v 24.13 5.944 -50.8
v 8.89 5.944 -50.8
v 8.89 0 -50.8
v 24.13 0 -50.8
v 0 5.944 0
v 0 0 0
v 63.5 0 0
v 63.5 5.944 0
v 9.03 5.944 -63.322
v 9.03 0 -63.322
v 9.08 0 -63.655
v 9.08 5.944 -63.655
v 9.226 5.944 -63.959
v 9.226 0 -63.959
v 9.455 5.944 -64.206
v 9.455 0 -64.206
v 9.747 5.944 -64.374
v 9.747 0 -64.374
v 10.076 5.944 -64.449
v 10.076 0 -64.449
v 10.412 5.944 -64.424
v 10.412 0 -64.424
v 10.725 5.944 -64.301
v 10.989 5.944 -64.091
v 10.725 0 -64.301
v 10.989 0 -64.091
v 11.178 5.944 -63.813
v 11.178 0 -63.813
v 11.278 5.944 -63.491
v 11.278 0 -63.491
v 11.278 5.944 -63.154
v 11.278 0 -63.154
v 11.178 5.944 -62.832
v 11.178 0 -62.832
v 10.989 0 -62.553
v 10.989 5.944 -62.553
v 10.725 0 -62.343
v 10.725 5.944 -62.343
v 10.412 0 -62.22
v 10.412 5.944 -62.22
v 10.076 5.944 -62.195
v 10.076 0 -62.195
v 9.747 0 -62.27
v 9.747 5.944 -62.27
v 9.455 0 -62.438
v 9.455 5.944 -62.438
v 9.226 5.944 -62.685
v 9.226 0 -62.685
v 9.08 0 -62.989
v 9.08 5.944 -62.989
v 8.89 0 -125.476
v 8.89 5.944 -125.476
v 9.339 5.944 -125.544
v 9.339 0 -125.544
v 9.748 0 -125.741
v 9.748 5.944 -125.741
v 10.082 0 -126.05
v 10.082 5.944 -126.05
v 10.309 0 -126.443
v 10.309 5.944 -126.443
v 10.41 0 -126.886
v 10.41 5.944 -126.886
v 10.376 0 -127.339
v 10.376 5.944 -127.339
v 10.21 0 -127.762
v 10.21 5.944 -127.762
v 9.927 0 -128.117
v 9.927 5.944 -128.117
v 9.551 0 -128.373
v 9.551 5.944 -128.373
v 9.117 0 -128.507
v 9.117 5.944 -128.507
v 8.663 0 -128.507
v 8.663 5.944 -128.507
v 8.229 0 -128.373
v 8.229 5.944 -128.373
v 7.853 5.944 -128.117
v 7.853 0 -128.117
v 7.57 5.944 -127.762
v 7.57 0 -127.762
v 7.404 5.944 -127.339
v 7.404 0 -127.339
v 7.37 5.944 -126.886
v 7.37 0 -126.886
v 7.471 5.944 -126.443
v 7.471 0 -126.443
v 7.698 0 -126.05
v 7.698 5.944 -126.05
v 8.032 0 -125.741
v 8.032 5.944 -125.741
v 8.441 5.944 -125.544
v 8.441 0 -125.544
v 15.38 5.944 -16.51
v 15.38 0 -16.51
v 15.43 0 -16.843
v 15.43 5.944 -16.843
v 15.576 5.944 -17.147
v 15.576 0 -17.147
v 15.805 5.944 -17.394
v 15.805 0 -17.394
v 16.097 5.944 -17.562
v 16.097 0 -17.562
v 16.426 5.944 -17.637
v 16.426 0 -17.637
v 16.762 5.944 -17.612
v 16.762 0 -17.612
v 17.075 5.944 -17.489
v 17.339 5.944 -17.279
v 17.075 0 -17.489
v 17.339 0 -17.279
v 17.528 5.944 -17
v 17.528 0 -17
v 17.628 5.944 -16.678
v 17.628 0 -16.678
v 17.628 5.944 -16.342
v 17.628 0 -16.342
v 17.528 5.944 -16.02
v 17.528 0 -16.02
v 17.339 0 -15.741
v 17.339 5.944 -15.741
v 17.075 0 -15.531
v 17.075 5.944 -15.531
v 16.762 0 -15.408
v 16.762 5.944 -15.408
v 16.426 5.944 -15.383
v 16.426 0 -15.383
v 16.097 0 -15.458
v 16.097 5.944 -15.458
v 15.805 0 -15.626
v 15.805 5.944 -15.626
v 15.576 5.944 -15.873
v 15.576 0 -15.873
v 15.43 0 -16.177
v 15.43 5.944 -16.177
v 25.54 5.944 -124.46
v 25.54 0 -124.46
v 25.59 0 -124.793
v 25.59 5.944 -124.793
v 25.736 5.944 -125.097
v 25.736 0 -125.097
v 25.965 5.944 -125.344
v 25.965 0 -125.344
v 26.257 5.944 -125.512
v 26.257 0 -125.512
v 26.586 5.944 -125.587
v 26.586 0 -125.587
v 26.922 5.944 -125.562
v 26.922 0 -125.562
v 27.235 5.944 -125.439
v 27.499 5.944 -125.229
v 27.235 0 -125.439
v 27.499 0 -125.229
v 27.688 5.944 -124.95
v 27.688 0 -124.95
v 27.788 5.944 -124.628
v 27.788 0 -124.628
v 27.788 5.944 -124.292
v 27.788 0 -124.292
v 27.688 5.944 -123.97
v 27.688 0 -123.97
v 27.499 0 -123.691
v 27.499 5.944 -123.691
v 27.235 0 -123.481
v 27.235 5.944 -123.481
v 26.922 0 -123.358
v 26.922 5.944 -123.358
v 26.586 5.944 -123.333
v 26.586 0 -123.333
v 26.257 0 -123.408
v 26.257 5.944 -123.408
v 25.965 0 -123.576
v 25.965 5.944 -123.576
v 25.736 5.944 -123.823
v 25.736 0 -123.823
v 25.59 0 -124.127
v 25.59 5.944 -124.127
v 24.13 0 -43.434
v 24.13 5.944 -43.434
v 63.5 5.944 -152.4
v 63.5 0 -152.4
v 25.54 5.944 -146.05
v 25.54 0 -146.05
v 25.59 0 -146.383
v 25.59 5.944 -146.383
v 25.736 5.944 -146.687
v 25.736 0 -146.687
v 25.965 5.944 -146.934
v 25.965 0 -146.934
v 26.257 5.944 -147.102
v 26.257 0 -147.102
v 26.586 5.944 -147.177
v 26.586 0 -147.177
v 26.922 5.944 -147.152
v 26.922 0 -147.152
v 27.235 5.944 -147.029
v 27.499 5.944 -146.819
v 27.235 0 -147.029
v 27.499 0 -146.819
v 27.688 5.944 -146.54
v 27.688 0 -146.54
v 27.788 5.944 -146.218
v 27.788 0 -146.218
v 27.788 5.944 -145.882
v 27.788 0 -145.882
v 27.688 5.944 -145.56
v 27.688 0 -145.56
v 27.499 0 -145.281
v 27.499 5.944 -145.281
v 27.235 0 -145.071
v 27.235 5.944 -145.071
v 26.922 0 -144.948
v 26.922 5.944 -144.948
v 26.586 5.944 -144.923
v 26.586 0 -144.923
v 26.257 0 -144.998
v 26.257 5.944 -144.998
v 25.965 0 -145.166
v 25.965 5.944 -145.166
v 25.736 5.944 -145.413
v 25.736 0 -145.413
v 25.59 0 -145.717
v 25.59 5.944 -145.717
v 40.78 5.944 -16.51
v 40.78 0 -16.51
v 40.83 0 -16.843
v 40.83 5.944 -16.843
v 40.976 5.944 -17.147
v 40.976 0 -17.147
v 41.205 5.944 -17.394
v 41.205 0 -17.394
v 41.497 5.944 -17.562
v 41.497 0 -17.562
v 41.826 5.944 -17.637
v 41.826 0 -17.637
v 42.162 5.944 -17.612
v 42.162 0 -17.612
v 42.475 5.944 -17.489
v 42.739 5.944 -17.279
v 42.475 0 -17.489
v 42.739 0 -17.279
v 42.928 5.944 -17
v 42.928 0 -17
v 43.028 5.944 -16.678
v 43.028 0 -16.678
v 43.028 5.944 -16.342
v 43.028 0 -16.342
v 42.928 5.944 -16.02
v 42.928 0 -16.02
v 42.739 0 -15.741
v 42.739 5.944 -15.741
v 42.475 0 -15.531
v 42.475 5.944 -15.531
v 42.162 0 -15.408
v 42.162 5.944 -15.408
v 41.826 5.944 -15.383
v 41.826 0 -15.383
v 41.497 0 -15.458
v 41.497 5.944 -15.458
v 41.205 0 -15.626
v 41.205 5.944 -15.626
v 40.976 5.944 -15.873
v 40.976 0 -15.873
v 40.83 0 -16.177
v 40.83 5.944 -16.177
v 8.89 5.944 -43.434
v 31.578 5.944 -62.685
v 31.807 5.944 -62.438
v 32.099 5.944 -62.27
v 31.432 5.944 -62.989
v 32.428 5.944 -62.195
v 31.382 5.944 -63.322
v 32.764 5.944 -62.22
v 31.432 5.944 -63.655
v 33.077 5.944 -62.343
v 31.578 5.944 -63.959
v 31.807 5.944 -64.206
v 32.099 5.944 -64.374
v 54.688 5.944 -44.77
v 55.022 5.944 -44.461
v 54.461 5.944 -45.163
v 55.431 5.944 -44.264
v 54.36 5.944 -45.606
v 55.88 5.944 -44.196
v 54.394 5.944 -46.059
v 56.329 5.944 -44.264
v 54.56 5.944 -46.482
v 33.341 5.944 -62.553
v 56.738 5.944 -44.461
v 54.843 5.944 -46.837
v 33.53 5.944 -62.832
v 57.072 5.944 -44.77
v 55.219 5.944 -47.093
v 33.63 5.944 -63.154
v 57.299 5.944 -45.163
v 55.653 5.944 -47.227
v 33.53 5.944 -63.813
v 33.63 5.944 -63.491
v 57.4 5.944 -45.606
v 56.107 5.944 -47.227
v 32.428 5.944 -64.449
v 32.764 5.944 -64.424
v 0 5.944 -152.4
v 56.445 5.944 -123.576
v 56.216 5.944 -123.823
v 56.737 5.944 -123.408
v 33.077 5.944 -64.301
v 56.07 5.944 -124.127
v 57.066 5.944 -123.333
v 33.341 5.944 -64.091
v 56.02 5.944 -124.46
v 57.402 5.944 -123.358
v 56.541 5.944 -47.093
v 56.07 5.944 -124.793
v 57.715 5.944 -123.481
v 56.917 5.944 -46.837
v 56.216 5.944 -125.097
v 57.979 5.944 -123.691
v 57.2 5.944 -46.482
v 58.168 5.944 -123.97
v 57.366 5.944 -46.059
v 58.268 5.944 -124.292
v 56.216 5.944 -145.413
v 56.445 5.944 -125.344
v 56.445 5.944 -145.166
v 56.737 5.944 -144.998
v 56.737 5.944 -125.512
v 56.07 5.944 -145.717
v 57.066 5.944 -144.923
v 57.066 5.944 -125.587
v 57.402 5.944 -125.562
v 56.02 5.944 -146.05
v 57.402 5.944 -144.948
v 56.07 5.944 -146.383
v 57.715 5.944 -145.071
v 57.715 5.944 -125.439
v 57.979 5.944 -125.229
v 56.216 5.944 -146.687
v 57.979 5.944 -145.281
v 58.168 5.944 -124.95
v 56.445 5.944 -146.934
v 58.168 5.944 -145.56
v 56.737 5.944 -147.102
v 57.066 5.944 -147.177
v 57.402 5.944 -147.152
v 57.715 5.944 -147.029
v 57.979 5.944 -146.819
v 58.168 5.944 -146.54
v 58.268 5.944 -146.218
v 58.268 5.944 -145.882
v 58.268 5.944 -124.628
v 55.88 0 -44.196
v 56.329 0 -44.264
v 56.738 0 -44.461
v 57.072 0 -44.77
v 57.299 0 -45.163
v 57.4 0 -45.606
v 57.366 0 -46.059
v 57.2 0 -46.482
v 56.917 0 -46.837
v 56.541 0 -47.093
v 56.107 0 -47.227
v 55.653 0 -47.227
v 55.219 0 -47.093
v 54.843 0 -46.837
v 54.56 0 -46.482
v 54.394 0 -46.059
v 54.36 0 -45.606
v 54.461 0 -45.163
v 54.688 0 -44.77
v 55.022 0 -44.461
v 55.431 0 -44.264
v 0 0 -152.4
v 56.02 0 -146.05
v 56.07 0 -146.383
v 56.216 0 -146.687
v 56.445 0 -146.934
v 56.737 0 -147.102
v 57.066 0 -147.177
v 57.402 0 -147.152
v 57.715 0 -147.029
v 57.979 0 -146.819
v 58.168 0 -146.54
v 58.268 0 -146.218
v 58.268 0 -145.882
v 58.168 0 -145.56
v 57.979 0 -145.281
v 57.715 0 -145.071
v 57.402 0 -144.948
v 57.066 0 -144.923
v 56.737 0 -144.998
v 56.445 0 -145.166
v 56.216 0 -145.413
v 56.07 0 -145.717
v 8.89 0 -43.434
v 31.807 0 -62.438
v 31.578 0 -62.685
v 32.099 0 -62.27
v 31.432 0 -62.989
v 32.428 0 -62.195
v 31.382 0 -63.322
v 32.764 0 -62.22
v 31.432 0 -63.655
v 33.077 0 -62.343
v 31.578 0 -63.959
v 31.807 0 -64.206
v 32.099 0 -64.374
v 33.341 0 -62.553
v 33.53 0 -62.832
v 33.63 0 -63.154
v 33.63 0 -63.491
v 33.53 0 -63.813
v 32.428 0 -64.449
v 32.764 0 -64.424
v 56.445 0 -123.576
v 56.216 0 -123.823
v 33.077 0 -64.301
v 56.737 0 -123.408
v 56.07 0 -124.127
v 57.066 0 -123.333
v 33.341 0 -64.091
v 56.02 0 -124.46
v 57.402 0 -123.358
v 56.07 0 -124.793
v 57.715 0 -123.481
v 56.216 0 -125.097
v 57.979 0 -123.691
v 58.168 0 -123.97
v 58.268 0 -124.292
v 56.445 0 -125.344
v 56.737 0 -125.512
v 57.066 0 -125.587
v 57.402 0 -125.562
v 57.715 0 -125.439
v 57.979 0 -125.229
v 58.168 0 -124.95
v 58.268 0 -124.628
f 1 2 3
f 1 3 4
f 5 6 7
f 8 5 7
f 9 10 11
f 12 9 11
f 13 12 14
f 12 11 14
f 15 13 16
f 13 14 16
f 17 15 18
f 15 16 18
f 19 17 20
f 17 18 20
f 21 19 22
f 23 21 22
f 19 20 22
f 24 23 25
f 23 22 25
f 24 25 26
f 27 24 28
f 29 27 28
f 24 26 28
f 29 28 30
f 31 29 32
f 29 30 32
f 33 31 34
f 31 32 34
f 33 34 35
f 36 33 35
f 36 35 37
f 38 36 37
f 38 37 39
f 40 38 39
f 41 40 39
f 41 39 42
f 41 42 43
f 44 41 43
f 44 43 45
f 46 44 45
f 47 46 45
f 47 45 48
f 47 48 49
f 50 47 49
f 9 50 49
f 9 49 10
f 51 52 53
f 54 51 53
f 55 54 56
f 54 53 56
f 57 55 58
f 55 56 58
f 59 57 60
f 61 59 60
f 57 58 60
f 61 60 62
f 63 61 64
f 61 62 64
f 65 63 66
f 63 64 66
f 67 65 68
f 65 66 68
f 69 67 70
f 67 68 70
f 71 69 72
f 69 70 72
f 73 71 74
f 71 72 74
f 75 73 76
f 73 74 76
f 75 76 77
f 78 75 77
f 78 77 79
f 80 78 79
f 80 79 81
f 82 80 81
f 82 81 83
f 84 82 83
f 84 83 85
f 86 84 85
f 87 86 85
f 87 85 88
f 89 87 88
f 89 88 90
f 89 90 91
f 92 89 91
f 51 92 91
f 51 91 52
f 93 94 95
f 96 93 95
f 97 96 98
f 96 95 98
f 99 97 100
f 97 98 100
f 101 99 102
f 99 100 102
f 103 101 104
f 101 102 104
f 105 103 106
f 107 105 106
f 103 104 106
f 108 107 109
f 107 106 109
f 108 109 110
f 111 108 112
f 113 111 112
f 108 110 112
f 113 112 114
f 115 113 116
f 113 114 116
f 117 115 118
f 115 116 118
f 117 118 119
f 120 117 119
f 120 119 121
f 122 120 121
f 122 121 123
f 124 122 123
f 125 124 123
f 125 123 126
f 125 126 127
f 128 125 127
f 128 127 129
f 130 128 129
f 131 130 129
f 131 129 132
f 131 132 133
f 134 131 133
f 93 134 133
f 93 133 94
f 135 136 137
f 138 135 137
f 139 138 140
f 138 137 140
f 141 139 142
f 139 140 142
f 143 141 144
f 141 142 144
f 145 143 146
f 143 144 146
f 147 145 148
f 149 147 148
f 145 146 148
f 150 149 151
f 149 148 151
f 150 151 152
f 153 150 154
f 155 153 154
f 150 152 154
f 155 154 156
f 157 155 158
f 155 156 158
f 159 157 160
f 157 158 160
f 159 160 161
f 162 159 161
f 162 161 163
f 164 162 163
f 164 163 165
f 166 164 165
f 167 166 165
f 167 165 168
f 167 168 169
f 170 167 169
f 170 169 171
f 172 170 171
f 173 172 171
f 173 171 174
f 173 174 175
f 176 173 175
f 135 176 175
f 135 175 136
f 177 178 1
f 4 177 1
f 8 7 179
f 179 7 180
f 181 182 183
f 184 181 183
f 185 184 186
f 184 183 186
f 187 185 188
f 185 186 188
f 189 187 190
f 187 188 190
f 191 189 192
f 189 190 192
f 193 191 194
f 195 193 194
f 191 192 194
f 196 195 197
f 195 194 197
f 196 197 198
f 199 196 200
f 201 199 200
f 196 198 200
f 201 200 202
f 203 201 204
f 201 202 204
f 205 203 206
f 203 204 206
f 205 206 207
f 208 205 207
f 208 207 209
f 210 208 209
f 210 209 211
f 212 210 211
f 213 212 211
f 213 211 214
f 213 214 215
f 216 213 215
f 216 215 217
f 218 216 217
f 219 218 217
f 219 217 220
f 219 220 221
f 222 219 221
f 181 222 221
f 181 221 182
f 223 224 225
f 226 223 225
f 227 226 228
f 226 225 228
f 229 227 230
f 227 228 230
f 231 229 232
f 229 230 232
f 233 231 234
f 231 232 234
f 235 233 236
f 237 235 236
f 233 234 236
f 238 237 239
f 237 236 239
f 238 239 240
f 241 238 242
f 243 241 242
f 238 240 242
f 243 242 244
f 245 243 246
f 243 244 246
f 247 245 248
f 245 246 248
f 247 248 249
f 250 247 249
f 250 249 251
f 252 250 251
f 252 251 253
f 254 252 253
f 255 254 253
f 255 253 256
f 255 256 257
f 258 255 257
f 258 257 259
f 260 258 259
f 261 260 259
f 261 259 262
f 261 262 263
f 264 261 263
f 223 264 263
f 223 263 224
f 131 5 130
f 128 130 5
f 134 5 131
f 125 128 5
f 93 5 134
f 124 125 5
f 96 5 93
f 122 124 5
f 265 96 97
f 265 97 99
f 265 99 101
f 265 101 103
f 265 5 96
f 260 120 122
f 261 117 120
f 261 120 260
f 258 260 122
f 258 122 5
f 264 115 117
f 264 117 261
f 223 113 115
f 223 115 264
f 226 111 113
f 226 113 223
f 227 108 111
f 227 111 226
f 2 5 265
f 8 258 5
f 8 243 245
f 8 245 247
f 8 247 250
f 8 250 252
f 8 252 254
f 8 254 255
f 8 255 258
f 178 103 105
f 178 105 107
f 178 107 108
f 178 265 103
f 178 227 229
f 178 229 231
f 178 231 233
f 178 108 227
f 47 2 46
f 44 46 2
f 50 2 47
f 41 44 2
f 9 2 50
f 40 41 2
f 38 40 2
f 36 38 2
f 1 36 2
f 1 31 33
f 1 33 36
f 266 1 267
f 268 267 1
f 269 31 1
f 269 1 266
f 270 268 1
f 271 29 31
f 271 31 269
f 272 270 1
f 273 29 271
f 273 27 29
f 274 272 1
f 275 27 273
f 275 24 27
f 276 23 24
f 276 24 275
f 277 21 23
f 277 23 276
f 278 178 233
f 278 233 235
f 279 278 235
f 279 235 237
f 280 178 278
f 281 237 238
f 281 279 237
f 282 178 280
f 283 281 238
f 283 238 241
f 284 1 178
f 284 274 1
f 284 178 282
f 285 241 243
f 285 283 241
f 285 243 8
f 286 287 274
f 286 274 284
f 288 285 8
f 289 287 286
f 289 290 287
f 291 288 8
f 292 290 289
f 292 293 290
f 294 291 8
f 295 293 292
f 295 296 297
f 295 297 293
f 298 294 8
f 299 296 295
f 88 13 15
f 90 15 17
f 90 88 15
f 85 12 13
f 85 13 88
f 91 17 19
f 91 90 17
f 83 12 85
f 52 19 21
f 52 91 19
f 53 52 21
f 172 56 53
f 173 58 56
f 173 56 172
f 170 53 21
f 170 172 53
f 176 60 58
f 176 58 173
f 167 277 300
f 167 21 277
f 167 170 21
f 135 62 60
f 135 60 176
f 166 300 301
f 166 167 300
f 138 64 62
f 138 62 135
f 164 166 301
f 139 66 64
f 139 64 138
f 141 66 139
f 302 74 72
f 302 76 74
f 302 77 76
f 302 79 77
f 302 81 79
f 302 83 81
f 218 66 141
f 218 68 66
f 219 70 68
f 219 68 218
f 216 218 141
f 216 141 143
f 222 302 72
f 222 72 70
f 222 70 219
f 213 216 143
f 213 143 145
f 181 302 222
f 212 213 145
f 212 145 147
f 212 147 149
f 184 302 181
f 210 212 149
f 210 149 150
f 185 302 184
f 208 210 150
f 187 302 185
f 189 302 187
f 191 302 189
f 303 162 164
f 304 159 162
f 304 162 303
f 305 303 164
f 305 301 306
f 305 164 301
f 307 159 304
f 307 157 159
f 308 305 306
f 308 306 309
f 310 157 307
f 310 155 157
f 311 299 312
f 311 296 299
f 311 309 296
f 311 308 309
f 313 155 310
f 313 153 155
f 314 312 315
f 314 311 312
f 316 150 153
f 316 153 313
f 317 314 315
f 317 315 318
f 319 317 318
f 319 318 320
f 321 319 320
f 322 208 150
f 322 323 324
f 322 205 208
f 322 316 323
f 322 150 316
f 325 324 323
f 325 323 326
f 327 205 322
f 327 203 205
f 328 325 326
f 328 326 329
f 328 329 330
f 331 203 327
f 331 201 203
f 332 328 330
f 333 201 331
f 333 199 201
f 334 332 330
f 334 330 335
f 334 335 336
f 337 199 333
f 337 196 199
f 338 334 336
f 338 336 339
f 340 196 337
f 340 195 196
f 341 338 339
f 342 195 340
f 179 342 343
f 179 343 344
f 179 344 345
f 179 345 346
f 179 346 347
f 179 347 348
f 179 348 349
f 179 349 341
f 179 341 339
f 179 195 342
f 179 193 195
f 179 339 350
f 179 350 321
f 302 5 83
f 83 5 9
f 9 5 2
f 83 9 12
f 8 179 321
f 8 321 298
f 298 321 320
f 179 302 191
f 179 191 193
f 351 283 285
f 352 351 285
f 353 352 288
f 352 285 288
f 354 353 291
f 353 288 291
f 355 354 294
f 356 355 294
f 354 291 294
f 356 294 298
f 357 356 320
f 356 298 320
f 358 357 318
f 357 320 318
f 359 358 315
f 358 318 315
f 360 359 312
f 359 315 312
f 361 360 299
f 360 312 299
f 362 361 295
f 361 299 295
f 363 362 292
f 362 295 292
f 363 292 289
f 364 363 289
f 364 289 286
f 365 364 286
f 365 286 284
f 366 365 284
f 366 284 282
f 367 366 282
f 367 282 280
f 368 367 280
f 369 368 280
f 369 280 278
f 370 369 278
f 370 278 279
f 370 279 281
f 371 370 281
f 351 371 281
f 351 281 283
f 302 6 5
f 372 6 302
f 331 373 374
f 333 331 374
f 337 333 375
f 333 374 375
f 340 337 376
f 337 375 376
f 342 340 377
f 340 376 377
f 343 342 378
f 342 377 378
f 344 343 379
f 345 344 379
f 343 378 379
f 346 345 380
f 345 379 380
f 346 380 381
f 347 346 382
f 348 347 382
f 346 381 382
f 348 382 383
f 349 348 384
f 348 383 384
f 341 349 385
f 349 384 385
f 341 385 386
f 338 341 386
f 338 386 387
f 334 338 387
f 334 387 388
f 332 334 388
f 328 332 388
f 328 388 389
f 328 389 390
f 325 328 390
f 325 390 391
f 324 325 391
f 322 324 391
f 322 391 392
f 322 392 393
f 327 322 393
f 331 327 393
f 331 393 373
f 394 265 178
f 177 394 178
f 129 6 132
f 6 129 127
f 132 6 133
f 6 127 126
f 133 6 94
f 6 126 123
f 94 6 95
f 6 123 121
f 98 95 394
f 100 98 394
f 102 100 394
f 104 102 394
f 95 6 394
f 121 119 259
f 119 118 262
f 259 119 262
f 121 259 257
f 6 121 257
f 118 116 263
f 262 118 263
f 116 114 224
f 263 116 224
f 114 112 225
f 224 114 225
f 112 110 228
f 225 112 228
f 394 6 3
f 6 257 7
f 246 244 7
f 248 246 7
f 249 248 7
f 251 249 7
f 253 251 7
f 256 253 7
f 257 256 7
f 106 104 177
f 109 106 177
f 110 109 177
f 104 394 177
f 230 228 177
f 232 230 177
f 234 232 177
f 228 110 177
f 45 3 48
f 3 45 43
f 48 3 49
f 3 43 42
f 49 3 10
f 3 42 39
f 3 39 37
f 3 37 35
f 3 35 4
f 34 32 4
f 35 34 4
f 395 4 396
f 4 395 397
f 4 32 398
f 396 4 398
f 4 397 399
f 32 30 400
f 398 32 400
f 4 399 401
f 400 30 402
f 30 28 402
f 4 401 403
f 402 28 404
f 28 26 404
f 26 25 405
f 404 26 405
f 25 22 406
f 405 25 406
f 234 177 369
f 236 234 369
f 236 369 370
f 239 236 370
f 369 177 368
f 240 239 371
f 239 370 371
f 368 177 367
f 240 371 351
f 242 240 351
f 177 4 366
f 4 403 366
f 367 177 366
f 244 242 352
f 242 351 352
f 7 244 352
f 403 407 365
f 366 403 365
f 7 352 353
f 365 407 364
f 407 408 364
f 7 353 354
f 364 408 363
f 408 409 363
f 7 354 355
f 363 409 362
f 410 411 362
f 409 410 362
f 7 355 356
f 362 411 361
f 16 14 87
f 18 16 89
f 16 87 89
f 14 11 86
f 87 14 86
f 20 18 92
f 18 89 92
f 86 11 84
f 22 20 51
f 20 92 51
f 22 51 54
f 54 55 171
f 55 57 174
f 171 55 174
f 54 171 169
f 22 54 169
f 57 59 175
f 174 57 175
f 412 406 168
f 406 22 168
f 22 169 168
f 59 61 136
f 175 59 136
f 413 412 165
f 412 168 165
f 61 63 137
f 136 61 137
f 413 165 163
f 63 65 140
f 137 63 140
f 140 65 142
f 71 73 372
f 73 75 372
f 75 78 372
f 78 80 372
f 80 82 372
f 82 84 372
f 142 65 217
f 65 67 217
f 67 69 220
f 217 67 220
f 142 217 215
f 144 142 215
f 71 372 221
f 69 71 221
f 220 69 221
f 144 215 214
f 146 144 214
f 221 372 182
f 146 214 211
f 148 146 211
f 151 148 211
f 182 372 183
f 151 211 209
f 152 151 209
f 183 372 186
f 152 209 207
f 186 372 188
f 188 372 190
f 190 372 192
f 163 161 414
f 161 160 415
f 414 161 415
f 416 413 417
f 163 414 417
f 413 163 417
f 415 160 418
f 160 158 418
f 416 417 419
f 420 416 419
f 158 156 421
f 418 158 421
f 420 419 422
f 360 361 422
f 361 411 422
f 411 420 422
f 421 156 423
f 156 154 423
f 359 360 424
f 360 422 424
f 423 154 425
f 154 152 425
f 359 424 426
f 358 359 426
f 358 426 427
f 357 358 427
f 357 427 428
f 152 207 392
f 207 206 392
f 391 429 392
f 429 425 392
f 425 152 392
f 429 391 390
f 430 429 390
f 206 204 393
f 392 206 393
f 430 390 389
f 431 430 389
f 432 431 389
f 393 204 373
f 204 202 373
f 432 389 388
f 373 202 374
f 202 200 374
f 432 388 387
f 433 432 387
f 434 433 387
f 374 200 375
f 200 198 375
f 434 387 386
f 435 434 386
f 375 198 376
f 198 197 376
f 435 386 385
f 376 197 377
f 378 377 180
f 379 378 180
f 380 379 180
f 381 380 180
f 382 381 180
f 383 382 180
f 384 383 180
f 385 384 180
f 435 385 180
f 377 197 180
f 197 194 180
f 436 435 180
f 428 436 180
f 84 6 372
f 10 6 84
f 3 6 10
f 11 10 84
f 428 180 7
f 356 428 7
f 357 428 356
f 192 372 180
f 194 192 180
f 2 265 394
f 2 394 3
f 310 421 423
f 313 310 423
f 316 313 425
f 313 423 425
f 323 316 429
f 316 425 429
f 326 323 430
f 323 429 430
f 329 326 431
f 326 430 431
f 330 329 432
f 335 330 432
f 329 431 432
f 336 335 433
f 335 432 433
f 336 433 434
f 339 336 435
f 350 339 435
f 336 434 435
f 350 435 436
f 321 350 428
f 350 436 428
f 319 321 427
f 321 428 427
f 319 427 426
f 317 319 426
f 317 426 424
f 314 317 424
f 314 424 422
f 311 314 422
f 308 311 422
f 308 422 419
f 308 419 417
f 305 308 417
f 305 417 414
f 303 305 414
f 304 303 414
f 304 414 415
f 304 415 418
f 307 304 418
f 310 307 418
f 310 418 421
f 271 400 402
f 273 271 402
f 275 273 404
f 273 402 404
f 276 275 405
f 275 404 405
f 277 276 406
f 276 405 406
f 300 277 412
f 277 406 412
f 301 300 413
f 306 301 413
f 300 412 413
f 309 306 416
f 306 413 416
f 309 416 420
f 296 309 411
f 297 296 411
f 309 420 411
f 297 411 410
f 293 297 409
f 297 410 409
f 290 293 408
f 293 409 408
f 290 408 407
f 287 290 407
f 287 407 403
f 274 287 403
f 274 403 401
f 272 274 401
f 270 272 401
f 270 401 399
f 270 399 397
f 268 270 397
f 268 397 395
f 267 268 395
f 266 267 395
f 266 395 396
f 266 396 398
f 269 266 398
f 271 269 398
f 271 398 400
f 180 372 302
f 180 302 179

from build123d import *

# Parameters (mm, degrees)
SKETCH1_W             = 63.5
SKETCH1_H             = 152.4
BOSS_EXTRUDE1_DEPTH   = 5.9436
SKETCH4_W             = 15.24
SKETCH4_H             = 7.366
CUT_EXTRUDE3_DEPTH    = 166.206950159
F_4_40_TAPPED_HOLE1_D = 2.2606
F_4_40_TAPPED_HOLE2_D = 2.2606
F_4_40_TAPPED_HOLE3_D = 2.2606
SKETCH13_R            = 1.524
CUT_EXTRUDE5_DEPTH    = 166.206950159


with BuildPart() as part:
    # Sketch1 → Boss-Extrude1 (new body)
    with BuildSketch(Plane(origin=(0, 0, 0), x_dir=(1, 0, 0), z_dir=(0, 1, 0))):
        with Locations((31.75, 76.2)):
            Rectangle(SKETCH1_W, SKETCH1_H)
    extrude(amount=BOSS_EXTRUDE1_DEPTH)

    # Sketch4 → Cut-Extrude3 (cut, through all)
    with BuildSketch(Plane(origin=(0, 5.9436, 0), x_dir=(1, 0, 0), z_dir=(0, 1, 0))):
        with Locations((16.51, 47.117)):
            Rectangle(SKETCH4_W, SKETCH4_H)
    extrude(amount=-CUT_EXTRUDE3_DEPTH, mode=Mode.SUBTRACT)

    # #4-40 Tapped Hole1 (through all)
    with Locations(Plane(origin=(0, 5.9436, 0), x_dir=(1, 0, 0), z_dir=(0, 1, 0))):
        with Locations((57.15, 146.05), (57.15, 124.46), (26.67, 124.46), (26.67, 146.05)):
            Hole(F_4_40_TAPPED_HOLE1_D / 2)

    # #4-40 Tapped Hole2 (through all)
    with Locations(Plane(origin=(0, 5.9436, 0), x_dir=(1, 0, 0), z_dir=(0, 1, 0))):
        with Locations((32.512, 63.3222), (10.16, 63.3222)):
            Hole(F_4_40_TAPPED_HOLE2_D / 2)

    # #4-40 Tapped Hole3 (through all)
    with Locations(Plane(origin=(0, 5.9436, 0), x_dir=(1, 0, 0), z_dir=(0, 1, 0))):
        with Locations((41.91, 16.51), (16.51, 16.51)):
            Hole(F_4_40_TAPPED_HOLE3_D / 2)

    # Sketch13 → Cut-Extrude5 (cut, through all)
    with BuildSketch(Plane(origin=(0, 5.9436, 0), x_dir=(1, 0, 0), z_dir=(0, 1, 0))):
        with Locations(Location((8.89, 127, 0), (0, 0, 270))):
            Circle(SKETCH13_R)
        with Locations(Location((55.88, 45.72, 0), (0, 0, 270))):
            Circle(SKETCH13_R)
    extrude(amount=-CUT_EXTRUDE5_DEPTH, mode=Mode.SUBTRACT)


solid = part.part
